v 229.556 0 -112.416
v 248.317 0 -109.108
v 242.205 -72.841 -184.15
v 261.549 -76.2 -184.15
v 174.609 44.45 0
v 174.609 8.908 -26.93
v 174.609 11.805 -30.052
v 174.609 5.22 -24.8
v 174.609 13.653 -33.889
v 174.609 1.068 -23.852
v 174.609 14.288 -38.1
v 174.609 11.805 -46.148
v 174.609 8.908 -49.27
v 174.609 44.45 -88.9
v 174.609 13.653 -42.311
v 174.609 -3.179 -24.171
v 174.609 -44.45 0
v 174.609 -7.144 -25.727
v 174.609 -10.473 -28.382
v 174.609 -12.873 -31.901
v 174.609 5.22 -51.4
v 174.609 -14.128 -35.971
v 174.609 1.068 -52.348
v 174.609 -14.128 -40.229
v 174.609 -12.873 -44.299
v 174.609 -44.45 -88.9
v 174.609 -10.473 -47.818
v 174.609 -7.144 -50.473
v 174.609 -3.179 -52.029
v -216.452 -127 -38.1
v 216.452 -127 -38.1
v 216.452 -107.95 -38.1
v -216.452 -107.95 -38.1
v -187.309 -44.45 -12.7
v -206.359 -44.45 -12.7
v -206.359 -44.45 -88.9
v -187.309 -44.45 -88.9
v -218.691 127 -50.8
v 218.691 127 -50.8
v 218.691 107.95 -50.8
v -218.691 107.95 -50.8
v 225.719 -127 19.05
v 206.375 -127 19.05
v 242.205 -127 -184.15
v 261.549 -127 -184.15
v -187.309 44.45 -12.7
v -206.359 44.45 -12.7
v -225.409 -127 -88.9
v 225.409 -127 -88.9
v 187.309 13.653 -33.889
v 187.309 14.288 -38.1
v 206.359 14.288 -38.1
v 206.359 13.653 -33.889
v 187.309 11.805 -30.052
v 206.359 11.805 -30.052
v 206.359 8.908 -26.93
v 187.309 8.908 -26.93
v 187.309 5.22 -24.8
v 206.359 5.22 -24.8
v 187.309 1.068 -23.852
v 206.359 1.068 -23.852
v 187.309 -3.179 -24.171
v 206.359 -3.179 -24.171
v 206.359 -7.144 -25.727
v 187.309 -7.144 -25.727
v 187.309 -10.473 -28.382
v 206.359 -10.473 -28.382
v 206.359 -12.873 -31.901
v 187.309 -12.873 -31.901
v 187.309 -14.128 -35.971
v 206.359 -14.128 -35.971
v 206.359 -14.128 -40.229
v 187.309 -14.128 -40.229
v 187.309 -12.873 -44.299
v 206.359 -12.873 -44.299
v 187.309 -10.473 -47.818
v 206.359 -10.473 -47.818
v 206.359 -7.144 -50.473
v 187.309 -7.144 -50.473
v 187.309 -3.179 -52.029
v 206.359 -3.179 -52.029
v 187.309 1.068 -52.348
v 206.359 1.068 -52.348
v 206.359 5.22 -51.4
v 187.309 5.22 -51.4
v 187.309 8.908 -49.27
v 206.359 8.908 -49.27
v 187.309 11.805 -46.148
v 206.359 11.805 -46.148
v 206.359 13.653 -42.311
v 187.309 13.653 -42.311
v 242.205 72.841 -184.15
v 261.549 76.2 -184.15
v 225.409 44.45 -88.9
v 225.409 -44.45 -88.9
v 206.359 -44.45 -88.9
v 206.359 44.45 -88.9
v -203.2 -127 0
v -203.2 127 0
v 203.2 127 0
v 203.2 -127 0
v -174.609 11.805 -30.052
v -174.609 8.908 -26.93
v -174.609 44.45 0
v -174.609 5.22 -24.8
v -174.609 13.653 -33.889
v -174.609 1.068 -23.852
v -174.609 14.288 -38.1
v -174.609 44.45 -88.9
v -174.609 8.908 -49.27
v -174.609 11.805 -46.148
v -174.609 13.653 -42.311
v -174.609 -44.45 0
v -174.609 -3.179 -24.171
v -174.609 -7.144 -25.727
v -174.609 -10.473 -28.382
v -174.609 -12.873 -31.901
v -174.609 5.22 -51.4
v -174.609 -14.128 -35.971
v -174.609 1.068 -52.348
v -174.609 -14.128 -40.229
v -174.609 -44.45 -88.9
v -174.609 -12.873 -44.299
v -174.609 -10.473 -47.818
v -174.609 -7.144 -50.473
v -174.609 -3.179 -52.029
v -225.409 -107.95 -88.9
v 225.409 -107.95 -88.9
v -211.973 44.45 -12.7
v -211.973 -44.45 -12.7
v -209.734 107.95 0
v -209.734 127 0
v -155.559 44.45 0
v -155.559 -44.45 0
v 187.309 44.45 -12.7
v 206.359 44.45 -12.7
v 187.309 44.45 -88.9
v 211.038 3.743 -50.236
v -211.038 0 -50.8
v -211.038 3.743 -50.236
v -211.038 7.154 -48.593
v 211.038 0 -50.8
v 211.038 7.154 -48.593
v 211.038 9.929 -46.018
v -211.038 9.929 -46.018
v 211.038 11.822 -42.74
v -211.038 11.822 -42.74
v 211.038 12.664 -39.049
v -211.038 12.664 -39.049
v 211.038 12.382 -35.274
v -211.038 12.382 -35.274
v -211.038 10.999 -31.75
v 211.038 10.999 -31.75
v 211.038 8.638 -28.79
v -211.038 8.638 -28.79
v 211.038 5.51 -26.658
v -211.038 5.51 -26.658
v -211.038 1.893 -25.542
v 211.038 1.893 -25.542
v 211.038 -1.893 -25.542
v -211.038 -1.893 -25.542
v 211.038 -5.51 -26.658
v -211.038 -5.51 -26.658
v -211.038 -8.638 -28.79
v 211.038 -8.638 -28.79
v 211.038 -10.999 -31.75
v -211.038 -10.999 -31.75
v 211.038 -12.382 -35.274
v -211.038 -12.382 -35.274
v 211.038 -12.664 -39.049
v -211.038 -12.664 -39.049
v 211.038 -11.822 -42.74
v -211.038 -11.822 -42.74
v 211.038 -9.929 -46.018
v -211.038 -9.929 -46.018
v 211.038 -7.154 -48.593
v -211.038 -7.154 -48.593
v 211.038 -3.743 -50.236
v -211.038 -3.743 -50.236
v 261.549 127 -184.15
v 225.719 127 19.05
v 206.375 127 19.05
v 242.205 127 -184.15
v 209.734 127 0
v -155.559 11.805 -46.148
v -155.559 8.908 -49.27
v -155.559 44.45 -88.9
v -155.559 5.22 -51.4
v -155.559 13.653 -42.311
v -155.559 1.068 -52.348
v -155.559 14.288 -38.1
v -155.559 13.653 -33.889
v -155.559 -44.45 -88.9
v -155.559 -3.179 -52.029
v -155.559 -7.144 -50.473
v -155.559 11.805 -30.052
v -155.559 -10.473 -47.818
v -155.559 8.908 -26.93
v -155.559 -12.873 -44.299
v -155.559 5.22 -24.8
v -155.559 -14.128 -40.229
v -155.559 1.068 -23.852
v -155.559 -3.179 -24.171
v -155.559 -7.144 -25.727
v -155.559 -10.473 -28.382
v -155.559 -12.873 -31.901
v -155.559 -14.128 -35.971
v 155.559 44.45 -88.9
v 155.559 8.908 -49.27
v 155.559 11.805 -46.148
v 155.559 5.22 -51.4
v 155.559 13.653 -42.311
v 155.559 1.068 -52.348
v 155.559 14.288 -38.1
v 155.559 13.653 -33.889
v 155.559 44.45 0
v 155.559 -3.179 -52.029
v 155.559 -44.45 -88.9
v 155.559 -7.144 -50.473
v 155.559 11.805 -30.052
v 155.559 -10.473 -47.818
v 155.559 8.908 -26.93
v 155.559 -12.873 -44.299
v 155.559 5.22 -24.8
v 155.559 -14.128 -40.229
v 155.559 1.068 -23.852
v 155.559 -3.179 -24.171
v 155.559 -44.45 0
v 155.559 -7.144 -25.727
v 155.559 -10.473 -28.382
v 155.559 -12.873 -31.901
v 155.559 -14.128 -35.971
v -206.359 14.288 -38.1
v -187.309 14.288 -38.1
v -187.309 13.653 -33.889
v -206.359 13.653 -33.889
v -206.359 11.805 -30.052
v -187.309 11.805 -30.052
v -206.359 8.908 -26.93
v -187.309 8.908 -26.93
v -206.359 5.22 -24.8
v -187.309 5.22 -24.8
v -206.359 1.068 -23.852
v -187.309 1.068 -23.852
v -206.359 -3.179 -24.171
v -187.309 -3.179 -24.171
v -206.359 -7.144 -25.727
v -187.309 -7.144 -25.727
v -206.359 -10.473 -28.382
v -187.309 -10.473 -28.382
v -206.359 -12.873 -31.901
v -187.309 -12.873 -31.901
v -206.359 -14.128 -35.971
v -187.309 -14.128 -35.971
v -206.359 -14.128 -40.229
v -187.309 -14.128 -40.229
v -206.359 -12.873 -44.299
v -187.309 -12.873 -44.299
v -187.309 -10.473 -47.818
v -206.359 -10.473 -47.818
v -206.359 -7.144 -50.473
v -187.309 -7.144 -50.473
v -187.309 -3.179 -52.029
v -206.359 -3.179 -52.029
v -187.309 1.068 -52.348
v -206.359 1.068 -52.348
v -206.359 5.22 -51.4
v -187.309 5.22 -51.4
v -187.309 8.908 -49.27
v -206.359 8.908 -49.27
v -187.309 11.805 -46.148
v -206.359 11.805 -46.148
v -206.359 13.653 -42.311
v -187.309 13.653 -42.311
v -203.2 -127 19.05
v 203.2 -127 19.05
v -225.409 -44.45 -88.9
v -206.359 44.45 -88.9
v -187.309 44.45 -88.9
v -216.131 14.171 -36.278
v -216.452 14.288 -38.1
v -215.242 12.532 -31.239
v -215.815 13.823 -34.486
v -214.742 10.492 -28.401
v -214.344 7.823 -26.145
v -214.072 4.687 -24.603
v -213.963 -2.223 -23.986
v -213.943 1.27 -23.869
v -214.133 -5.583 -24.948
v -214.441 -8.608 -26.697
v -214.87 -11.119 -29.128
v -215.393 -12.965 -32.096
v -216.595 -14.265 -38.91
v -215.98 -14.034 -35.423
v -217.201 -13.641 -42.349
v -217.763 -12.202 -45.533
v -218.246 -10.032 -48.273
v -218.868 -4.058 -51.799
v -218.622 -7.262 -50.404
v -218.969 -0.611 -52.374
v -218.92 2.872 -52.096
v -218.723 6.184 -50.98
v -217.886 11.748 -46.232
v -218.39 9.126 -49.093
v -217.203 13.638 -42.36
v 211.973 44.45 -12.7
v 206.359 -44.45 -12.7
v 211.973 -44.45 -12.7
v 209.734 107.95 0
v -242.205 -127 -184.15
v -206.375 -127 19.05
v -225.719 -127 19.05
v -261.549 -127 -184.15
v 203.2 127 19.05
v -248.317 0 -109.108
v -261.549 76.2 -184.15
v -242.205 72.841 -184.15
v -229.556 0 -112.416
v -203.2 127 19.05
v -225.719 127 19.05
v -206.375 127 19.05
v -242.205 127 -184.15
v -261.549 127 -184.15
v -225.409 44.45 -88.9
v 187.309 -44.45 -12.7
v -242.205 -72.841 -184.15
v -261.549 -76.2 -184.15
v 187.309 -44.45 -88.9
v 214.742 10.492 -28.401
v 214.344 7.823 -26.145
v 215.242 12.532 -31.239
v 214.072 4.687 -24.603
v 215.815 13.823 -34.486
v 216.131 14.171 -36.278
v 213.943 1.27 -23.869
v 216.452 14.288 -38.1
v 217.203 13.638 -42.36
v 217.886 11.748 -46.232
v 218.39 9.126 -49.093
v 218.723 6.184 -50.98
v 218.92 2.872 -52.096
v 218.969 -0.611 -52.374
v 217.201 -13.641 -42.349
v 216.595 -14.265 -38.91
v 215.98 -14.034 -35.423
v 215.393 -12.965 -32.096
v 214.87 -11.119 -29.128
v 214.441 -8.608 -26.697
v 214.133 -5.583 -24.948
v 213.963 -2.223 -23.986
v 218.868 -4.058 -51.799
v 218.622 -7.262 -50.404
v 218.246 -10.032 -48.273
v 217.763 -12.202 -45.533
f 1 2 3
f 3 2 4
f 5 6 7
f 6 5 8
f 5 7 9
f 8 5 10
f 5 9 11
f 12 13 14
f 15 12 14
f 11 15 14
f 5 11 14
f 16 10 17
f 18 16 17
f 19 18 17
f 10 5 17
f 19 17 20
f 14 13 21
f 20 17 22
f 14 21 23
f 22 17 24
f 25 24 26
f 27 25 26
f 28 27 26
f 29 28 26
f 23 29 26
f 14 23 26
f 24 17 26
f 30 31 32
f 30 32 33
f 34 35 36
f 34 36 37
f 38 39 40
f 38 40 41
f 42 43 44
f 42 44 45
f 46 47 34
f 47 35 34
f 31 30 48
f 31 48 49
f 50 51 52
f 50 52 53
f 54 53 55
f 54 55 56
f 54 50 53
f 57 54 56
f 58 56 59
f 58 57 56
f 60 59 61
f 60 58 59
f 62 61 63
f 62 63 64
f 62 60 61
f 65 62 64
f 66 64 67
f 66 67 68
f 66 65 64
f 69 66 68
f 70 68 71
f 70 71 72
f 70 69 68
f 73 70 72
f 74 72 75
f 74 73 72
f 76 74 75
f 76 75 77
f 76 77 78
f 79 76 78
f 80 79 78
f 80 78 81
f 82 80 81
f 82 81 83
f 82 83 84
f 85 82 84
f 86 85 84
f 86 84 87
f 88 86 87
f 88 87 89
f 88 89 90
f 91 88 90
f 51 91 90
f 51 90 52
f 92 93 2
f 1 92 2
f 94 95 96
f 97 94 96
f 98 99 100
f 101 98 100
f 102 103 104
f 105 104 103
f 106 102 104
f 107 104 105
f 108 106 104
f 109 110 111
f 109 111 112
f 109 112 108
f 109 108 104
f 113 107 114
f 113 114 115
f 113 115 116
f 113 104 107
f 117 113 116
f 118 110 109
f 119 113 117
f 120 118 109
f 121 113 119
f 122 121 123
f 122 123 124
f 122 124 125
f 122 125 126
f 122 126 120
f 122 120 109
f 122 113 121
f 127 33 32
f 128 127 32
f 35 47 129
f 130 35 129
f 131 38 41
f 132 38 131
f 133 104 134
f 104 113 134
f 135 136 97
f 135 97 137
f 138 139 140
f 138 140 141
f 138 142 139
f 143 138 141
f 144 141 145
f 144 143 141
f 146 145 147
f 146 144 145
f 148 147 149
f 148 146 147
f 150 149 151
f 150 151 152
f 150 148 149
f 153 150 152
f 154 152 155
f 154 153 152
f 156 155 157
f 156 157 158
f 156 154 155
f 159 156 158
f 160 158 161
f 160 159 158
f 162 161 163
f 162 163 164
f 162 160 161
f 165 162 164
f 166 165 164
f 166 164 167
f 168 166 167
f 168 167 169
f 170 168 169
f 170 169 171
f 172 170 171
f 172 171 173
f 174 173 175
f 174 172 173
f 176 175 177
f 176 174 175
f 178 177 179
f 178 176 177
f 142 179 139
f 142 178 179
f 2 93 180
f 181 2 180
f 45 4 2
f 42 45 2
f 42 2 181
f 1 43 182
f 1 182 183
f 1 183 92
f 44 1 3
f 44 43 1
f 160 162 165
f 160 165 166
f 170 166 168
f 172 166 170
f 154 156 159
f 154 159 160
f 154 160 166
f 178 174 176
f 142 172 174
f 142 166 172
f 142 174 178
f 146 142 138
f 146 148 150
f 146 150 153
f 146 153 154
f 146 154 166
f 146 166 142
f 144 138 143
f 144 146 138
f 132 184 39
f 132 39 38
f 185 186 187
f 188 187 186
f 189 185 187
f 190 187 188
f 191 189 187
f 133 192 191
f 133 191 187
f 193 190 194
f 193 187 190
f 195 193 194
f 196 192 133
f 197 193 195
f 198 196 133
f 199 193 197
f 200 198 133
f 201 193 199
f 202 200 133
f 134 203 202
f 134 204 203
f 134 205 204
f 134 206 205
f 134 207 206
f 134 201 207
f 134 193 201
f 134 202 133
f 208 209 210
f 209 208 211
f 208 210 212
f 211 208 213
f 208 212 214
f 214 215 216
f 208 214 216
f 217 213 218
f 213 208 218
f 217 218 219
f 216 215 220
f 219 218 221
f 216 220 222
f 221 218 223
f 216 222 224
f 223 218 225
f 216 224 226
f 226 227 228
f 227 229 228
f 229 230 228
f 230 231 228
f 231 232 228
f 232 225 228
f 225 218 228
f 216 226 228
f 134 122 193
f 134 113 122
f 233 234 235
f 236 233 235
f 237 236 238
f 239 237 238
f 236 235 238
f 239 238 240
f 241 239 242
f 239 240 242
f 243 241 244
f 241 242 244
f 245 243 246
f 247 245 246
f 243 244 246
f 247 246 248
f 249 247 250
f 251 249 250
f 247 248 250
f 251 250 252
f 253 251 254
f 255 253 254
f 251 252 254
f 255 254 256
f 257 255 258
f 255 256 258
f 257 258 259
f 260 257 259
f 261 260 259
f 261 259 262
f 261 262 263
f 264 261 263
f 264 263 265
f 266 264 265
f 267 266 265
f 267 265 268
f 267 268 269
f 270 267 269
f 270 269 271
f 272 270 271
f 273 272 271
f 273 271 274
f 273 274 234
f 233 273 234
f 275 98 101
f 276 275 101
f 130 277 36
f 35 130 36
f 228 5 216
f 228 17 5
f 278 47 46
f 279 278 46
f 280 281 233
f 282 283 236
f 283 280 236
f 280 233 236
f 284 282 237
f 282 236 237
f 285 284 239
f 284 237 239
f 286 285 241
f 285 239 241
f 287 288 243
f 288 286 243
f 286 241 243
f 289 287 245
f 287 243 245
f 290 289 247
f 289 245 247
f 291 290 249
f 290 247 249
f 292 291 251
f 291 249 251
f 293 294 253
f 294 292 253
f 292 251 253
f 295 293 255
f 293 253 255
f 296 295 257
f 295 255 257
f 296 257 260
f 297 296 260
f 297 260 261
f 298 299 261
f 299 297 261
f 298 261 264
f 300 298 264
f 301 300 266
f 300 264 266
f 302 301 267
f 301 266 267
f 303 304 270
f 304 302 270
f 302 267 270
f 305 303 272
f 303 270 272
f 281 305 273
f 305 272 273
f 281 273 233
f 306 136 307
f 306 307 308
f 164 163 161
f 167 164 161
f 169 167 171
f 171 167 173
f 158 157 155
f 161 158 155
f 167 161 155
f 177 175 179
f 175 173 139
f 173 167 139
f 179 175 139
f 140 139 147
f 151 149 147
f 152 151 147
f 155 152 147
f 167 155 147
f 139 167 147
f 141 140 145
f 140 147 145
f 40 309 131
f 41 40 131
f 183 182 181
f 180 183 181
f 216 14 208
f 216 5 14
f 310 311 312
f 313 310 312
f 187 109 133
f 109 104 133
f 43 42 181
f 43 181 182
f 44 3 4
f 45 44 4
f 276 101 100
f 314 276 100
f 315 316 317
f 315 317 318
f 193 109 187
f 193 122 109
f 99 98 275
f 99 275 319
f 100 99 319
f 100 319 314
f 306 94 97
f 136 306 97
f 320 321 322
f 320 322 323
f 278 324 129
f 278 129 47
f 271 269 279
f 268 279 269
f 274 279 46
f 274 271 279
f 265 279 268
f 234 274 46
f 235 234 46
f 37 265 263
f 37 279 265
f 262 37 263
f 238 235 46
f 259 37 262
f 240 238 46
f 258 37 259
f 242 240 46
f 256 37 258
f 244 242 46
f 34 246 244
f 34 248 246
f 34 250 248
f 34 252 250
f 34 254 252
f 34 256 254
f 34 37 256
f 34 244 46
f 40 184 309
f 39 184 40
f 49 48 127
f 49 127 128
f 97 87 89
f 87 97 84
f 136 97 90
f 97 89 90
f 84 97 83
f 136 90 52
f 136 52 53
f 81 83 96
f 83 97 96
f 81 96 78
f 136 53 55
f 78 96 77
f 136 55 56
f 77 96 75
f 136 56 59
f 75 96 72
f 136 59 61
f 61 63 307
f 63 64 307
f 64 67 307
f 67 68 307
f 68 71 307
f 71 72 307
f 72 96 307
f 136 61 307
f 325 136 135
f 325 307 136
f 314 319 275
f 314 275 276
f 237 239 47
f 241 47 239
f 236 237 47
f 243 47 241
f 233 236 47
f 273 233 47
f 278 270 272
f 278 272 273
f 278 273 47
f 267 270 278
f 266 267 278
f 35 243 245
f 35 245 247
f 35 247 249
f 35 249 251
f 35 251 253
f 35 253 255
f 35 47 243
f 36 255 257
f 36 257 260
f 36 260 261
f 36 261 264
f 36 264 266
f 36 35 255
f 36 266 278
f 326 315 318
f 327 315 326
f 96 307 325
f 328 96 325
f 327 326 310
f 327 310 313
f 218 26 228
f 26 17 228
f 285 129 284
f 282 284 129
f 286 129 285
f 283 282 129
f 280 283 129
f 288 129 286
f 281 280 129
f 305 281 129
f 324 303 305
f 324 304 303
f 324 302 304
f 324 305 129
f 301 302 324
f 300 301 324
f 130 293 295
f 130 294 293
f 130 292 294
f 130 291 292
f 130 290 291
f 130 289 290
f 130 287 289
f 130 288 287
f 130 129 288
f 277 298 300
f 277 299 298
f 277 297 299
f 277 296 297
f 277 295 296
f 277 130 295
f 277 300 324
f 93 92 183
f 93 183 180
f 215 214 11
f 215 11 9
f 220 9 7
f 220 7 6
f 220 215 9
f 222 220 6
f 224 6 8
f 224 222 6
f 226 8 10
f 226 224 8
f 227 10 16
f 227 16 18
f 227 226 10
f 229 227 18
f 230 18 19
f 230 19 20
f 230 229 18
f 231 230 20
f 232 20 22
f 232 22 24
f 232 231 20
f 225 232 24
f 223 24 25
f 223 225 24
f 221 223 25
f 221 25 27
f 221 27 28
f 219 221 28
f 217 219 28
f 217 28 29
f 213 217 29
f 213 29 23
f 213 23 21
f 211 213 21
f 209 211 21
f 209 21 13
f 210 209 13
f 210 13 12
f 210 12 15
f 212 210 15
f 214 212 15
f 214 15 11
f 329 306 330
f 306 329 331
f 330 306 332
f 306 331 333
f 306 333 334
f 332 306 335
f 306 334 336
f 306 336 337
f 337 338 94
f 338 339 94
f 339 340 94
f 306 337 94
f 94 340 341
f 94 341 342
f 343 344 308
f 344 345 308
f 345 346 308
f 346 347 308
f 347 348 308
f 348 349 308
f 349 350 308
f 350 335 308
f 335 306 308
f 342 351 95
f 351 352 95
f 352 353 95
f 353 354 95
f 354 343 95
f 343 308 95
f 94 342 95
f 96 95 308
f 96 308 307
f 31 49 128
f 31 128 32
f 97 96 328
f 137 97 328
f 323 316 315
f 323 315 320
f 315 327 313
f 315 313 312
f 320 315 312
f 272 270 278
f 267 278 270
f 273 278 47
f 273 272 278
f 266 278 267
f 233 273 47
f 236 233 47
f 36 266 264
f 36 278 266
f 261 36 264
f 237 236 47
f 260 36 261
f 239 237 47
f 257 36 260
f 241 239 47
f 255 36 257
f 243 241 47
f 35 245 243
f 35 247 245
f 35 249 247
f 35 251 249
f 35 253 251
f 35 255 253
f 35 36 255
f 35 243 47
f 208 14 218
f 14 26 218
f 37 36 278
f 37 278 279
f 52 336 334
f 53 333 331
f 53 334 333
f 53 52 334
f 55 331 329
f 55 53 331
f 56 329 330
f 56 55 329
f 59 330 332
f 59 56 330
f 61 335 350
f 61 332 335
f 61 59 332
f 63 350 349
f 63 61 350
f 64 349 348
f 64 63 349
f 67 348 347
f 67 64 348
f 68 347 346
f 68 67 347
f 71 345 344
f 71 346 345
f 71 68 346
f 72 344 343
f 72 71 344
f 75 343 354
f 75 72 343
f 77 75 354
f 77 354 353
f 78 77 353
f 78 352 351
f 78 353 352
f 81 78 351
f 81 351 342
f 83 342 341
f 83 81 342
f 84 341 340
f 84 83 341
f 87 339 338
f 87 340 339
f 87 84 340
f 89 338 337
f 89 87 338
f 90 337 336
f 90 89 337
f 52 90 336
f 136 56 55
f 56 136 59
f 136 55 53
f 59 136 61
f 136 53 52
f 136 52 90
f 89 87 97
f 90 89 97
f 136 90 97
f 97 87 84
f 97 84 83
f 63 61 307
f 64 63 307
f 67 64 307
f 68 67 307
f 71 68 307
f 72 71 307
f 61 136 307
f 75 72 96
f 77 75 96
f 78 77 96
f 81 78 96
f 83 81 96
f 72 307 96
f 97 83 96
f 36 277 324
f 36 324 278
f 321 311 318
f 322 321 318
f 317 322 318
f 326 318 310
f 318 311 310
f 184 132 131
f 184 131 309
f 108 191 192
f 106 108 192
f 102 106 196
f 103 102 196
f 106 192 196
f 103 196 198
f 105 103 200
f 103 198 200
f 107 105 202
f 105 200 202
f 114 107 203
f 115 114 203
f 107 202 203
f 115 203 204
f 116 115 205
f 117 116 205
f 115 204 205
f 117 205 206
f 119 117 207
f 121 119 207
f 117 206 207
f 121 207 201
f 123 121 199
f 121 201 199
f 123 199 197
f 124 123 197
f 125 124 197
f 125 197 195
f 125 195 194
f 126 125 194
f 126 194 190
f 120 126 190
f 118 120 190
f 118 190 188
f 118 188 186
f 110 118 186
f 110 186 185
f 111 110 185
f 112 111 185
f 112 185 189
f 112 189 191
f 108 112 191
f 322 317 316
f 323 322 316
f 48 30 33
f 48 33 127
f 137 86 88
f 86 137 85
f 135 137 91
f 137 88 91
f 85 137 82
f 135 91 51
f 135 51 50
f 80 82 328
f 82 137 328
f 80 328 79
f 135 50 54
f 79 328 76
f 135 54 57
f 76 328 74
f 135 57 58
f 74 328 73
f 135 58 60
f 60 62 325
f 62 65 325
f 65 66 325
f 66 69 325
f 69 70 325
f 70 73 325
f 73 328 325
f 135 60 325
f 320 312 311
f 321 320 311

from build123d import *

# Parameters (mm, degrees)
F0_W          = 406.4
F0_H          = 254
F1_DEPTH      = 19.05
F3_DEPTH      = 127
F3_DEPTH_BACK = 127
F5_DEPTH      = 19.05
F8_DEPTH      = 19.05
F9_W          = 4.678236725
F9_H          = 12.7
F11_DEPTH     = 44.45
F10_R         = 14.2875
F10_R_2       = 12.7
F12_DEPTH     = 261.5495194364
F9_W_2        = 366.59723186
F9_W_3        = 19.05
F9_W_4        = 12.7
F9_H_2        = 36.5125
F9_H_3        = 23.8125
F9_H_4        = 1.5875
F15_DEPTH     = 44.45
F16_DEPTH     = 261.5495194364
F19_DEPTH     = 19.05
F9_H_5        = 38.1
F20_DEPTH     = 44.45
F21_DEPTH     = 261.5495194364


# Not quite as in the source:
# - a feature names something its author has since deleted; it is built from what else it names


with BuildPart() as f1:
    # F0 (on Top) → F1 (new body)
    with BuildSketch(Plane.XY):
        Rectangle(F0_W, F0_H)
    extrude(amount=F1_DEPTH)


with BuildPart() as f3:
    # F2 (on Front) → F3 (new body, two sides)
    with BuildSketch(Plane.XZ) as f3_sk:
        Polygon((261.5485194364, -184.15), (225.7188769564, 19.05), (206.375, 19.05), (242.20464248, -184.15), align=None)
    extrude(amount=F3_DEPTH)
    extrude(f3_sk.sketch, amount=-F3_DEPTH_BACK)

    # F4 (on face) → F5 (cut, through all)
    with BuildSketch(Plane(origin=(222.1703618674, 0, 39.174629111), x_dir=(0, 1, 0), z_dir=(0.984807753, 0, 0.1736481777))):
        Polygon((0, -150.5697714888), (-76.2000000001, -226.7697714888), (76.2000000001, -226.7697714888), align=None)
    extrude(amount=-F5_DEPTH, mode=Mode.SUBTRACT)


with BuildPart() as f6_1:
    # F6: instance of F3
    add(f3.part.mirror(Plane.YZ))


with BuildPart() as f8:
    # F7 (on face) → F8 (new body)
    with BuildSketch(Plane.XZ.offset(127)):
        Polygon((-216.4520869475, -38.1), (-225.4094975675, -88.9), (225.4094975675, -88.9), (216.4520869475, -38.1), align=None)
    extrude(amount=-F8_DEPTH)


with BuildPart() as f11:
    # F9 (on Front) → F11 (new body, symmetric)
    with BuildSketch(Plane.XZ):
        Polygon((-211.0377342925, -38.1), (-211.0377342925, -25.4), (-206.3594975675, -25.4), (-206.3594975675, -12.7), (-211.9733816375, -12.7), (-225.4094975675, -88.9), (-206.3594975675, -88.9), (-206.3594975675, -50.8), (-211.0377342925, -50.8), align=None)
        with Locations((-208.69861593, -31.75)):
            Rectangle(F9_W, F9_H)
        with Locations((-208.69861593, -44.45)):
            Rectangle(F9_W, F9_H)
    extrude(amount=F11_DEPTH, both=True)

    # F10 (on Right) → F12 (cut, through all)
    with BuildSketch(Plane.YZ):
        with Locations((0, -38.1)):
            Circle(F10_R)
        with Locations((0, -38.1)):
            Circle(F10_R_2, mode=Mode.SUBTRACT)
        with Locations((0, -38.1)):
            Circle(F10_R_2)
    extrude(amount=-F12_DEPTH, mode=Mode.SUBTRACT)


with BuildPart() as f13:
    # F9 (on Front) → F13 (revolve)
    with BuildSketch(Plane.XZ):
        with Locations((27.7391183625, -44.45)):
            Rectangle(F9_W_2, F9_H)
        with Locations((-208.69861593, -44.45)):
            Rectangle(F9_W, F9_H)
        with Locations((-165.0844975675, -44.45)):
            Rectangle(F9_W_3, F9_H)
        with Locations((-196.8344975675, -44.45)):
            Rectangle(F9_W_3, F9_H)
        with Locations((-180.9594975675, -44.45)):
            Rectangle(F9_W_4, F9_H)
    revolve(axis=Axis((0, 0, -38.1), (1, 0, 0)))


with BuildPart() as f14_1:
    # F14: instance of F11
    add(f11.part.mirror(Plane.YZ))


with BuildPart() as f15:
    # F9 (on Front) → F15 (new body, symmetric)
    with BuildSketch(Plane.XZ):
        with Locations((-165.0844975675, -70.64375)):
            Rectangle(F9_W_3, F9_H_2)
        with Locations((-165.0844975675, -11.90625)):
            Rectangle(F9_W_3, F9_H_3)
        with Locations((-165.0844975675, -24.60625)):
            Rectangle(F9_W_3, F9_H_4)
        with Locations((-165.0844975675, -31.75)):
            Rectangle(F9_W_3, F9_H)
        with Locations((-165.0844975675, -51.59375)):
            Rectangle(F9_W_3, F9_H_4)
        with Locations((-165.0844975675, -44.45)):
            Rectangle(F9_W_3, F9_H)
    extrude(amount=F15_DEPTH, both=True)

    # F10 (on Right) → F16 (cut, through all)
    with BuildSketch(Plane.YZ):
        with Locations((0, -38.1)):
            Circle(F10_R)
        with Locations((0, -38.1)):
            Circle(F10_R_2, mode=Mode.SUBTRACT)
        with Locations((0, -38.1)):
            Circle(F10_R_2)
    extrude(amount=-F16_DEPTH, mode=Mode.SUBTRACT)


with BuildPart() as f17_1:
    # F17: instance of F15
    add(f15.part.mirror(Plane.YZ))


with BuildPart() as f19:
    # F18 (on face) → F19 (new body)
    with BuildSketch(Plane(origin=(0, 127, 0), x_dir=(-1, 0, 0), z_dir=(0, 1, 0))):
        Polygon((209.7340289825, 0), (-209.7340289825, 0), (-218.6914396025, -50.8), (218.6914396025, -50.8), align=None)
    extrude(amount=-F19_DEPTH)


with BuildPart() as f20:
    # F9 (on Front) → F20 (new body, symmetric)
    with BuildSketch(Plane.XZ):
        with Locations((-196.8344975675, -19.05)):
            Rectangle(F9_W_3, F9_H)
        with Locations((-196.8344975675, -31.75)):
            Rectangle(F9_W_3, F9_H)
        with Locations((-196.8344975675, -44.45)):
            Rectangle(F9_W_3, F9_H)
        with Locations((-196.8344975675, -69.85)):
            Rectangle(F9_W_3, F9_H_5)
    extrude(amount=F20_DEPTH, both=True)

    # F10 (on Right) → F21 (cut, through all)
    with BuildSketch(Plane.YZ):
        with Locations((0, -38.1)):
            Circle(F10_R)
        with Locations((0, -38.1)):
            Circle(F10_R_2, mode=Mode.SUBTRACT)
        with Locations((0, -38.1)):
            Circle(F10_R_2)
    extrude(amount=-F21_DEPTH, mode=Mode.SUBTRACT)


with BuildPart() as f22_1:
    # F22: instance of F20
    add(f20.part.mirror(Plane.YZ))


solid = Compound([f1.part, f3.part, f6_1.part, f8.part, f11.part, f13.part, f14_1.part, f15.part, f17_1.part, f19.part, f20.part, f22_1.part])
